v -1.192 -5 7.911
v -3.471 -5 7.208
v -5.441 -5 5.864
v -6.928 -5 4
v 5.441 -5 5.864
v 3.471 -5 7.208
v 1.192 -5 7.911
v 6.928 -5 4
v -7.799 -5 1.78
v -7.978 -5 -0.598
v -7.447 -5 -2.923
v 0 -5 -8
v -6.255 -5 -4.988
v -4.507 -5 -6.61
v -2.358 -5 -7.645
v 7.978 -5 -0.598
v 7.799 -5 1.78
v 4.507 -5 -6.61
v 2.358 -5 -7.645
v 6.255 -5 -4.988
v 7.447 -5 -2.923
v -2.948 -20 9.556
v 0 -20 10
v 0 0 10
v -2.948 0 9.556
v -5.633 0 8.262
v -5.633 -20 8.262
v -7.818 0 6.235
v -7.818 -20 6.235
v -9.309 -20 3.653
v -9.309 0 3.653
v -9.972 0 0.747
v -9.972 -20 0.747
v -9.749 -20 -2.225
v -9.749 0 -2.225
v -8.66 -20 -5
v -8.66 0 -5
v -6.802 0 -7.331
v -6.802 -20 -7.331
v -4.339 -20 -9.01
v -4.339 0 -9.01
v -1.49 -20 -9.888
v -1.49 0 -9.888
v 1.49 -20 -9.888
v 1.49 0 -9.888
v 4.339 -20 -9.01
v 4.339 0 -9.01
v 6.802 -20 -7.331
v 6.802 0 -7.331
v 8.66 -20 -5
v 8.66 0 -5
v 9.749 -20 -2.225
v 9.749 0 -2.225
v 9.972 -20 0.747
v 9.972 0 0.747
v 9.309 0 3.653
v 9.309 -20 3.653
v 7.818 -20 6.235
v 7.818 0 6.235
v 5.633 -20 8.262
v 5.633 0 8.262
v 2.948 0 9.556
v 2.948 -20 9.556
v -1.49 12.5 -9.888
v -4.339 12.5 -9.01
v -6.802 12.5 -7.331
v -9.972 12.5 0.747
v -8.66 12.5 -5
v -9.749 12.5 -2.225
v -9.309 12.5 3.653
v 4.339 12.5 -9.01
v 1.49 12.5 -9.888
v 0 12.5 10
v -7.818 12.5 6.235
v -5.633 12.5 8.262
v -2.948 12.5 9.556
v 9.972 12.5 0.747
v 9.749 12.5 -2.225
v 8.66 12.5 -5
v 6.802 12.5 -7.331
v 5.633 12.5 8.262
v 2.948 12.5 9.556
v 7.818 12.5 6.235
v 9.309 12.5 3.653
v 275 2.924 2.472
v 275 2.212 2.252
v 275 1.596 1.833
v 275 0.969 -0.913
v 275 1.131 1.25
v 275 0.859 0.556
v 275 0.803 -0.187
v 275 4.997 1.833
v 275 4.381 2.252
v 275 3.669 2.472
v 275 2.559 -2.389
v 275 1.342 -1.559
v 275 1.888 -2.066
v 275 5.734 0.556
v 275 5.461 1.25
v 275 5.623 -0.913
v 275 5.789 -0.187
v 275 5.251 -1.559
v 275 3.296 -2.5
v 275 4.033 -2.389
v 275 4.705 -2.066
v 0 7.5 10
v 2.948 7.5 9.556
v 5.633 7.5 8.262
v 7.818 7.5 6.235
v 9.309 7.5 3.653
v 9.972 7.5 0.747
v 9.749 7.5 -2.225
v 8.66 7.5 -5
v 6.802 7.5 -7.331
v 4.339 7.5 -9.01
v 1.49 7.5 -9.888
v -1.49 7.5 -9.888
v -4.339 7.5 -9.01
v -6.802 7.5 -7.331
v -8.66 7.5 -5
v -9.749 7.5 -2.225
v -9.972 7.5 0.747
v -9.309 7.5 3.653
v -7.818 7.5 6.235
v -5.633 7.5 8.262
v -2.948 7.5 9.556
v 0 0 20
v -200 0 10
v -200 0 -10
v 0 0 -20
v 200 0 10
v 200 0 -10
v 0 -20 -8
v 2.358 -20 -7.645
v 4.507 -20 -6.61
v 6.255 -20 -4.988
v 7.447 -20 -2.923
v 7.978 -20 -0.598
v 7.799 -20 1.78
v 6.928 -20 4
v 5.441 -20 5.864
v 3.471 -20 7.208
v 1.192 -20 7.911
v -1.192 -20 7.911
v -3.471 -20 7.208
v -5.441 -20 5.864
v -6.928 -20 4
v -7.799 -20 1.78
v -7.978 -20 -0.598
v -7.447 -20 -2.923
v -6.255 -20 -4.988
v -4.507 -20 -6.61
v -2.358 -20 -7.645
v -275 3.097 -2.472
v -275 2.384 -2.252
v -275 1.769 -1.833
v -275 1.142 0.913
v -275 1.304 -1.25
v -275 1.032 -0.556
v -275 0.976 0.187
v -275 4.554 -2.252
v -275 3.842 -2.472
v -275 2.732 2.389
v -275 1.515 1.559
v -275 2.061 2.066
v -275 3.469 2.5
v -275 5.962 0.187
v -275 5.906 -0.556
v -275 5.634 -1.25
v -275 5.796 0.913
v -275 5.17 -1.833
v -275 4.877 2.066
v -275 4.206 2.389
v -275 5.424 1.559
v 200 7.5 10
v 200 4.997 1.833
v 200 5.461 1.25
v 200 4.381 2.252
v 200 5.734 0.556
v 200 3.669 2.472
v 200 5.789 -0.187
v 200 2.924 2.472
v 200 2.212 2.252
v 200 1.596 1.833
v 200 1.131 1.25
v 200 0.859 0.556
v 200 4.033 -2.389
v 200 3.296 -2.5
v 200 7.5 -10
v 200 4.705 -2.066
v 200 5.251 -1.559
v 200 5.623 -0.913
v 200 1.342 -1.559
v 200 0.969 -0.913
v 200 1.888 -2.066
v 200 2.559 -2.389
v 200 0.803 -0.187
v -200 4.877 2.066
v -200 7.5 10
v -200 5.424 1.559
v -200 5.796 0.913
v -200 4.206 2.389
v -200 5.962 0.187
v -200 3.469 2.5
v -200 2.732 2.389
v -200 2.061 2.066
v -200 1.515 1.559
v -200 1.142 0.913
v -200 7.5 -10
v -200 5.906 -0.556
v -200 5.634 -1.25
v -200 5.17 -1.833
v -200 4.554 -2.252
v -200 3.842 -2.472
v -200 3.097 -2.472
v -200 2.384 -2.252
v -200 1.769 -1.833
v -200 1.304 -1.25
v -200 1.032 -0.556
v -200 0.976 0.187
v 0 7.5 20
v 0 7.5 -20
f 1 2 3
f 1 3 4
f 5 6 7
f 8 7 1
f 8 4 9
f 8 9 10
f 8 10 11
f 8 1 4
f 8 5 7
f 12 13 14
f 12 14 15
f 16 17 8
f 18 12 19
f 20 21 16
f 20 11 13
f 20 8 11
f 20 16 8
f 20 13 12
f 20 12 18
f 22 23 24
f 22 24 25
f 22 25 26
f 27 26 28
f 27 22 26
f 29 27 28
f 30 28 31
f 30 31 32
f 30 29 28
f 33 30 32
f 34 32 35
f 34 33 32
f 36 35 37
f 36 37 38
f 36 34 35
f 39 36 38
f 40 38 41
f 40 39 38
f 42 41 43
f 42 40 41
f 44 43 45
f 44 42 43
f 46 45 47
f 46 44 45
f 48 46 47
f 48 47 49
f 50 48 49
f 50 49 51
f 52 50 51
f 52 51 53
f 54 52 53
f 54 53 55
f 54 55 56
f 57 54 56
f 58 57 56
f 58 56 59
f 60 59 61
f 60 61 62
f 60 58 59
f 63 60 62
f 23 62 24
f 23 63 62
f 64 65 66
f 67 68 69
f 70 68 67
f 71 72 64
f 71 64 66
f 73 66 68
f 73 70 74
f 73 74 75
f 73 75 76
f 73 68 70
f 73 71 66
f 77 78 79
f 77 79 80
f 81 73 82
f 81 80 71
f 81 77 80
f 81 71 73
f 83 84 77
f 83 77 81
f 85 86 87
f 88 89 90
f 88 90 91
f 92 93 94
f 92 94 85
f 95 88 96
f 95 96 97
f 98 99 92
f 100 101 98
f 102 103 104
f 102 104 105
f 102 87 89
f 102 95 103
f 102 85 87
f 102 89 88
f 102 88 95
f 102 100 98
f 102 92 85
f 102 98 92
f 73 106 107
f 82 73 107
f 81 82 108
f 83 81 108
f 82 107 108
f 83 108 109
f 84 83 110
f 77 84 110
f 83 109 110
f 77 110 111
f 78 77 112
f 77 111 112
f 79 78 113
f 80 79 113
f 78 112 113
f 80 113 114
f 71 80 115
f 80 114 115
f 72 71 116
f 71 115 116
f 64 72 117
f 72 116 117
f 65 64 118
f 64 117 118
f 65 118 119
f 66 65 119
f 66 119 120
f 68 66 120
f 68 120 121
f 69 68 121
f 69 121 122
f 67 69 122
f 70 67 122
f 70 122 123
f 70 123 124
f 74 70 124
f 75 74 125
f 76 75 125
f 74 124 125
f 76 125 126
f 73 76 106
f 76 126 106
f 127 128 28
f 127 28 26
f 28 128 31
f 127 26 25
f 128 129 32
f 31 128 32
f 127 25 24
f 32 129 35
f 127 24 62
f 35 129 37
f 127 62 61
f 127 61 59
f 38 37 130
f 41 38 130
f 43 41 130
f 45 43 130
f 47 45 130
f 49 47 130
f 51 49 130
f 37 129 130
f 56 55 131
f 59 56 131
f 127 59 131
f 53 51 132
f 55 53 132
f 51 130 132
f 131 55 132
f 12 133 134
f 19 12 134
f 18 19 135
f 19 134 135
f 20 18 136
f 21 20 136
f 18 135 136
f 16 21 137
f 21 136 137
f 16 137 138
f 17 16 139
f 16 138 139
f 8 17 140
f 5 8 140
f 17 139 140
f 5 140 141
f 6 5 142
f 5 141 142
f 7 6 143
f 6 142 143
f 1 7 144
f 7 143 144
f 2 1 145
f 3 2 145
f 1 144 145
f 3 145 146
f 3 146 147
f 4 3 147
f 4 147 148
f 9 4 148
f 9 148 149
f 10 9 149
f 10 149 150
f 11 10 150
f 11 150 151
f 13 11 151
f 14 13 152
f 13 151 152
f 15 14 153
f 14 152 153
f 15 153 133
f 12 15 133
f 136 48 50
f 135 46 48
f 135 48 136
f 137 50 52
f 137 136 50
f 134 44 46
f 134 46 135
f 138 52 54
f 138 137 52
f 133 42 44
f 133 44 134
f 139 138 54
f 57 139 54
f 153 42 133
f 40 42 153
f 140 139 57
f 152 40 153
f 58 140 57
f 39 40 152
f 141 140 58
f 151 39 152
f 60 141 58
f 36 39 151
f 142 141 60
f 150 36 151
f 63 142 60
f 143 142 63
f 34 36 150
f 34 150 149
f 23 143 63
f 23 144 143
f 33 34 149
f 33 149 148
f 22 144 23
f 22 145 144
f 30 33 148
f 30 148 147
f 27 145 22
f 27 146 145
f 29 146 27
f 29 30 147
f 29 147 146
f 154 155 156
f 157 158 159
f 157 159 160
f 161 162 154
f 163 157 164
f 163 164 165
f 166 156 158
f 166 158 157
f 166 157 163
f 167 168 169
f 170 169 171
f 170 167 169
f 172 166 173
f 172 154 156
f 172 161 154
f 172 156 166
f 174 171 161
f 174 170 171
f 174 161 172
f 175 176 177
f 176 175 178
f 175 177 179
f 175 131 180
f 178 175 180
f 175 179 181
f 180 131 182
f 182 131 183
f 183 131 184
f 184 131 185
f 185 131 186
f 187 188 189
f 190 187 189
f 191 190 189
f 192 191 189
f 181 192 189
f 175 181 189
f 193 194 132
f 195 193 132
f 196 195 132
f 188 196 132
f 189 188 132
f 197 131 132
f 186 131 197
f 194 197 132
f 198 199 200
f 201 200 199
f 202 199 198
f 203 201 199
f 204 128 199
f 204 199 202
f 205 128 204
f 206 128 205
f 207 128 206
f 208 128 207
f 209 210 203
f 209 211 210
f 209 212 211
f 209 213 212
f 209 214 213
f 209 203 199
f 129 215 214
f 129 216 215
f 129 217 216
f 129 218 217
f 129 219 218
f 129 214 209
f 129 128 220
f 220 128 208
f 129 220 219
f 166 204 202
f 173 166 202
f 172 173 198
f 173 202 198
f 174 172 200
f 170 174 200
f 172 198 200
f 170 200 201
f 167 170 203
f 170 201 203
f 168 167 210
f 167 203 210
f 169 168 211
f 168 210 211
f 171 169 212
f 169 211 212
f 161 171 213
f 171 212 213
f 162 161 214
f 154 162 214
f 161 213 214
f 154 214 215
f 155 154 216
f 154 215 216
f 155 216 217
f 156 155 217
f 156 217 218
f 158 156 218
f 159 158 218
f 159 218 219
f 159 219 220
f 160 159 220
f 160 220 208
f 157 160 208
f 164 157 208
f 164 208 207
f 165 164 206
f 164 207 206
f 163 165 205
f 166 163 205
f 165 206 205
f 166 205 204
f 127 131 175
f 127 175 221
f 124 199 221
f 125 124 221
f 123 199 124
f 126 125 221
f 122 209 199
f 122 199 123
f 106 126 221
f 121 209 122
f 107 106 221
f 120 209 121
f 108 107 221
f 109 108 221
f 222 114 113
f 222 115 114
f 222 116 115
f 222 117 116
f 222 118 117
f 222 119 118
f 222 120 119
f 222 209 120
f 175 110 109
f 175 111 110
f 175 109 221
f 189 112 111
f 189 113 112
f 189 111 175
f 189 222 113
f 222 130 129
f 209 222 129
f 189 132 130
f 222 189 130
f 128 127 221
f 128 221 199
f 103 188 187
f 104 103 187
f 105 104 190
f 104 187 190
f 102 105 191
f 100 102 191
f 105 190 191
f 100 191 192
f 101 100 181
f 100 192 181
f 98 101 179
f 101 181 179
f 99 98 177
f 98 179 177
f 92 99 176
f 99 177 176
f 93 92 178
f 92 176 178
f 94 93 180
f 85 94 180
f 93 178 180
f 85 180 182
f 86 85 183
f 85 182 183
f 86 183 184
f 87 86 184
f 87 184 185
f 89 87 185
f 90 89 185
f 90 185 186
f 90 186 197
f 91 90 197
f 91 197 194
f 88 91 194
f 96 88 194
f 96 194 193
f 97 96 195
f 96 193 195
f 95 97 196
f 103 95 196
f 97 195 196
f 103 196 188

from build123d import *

# Parameters (mm, degrees)
SKETCH1_W           = 400
SKETCH1_H           = 20
BOSS_EXTRUDE1_DEPTH = 7.5
SKETCH2_R           = 2.5
BOSS_EXTRUDE2_DEPTH = 75
SKETCH3_R           = 2.5
BOSS_EXTRUDE3_DEPTH = 75
SKETCH5_R           = 10
BOSS_EXTRUDE4_DEPTH = 5
BOSS_EXTRUDE5_START = 20
SKETCH6_R           = 10
BOSS_EXTRUDE5_DEPTH = 20
SKETCH7_R           = 8
CUT_EXTRUDE1_DEPTH  = 15


with BuildPart() as part:
    # Sketch1 → Boss-Extrude1 (new body)
    with BuildSketch(Plane(origin=(0, 0, 0), x_dir=(1, 0, 0), z_dir=(0, 1, 0))):
        Rectangle(SKETCH1_W, SKETCH1_H)
        Polygon((200, 10), (0, 20), (-200, 10), align=None)
        Polygon((0, -20), (-200, -10), (200, -10), align=None)
    extrude(amount=BOSS_EXTRUDE1_DEPTH)

    # Sketch2 → Boss-Extrude2 (add)
    with BuildSketch(Plane(origin=(200, 0, 0), x_dir=(0, 0, -1), z_dir=(1, 0, 0))):
        with Locations((0, 3.296264787)):
            Circle(SKETCH2_R)
    extrude(amount=BOSS_EXTRUDE2_DEPTH)

    # Sketch3 → Boss-Extrude3 (add)
    with BuildSketch(Plane.ZY.offset(200)):
        with Locations((0, 3.469116297)):
            Circle(SKETCH3_R)
    extrude(amount=BOSS_EXTRUDE3_DEPTH)

    # Sketch5 → Boss-Extrude4 (add)
    with BuildSketch(Plane(origin=(0, 7.5, 0), x_dir=(1, 0, 0), z_dir=(0, 1, 0))):
        with Locations(Location((0, 0, 0), (0, 0, 270))):
            Circle(SKETCH5_R)
    extrude(amount=BOSS_EXTRUDE4_DEPTH)

    # Sketch6 → Boss-Extrude5 (add)
    with BuildSketch(Plane.XZ.offset(BOSS_EXTRUDE5_START)):
        with Locations(Location((0, 0, 0), (0, 0, 90))):
            Circle(SKETCH6_R)
    extrude(amount=-BOSS_EXTRUDE5_DEPTH)

    # Sketch7 → Cut-Extrude1 (cut)
    with BuildSketch(Plane(origin=(0, -20, 0), x_dir=(-1, 0, 0), z_dir=(0, -1, 0))):
        with Locations(Location((0, 0, 0), (0, 0, 90))):
            Circle(SKETCH7_R)
    extrude(amount=-CUT_EXTRUDE1_DEPTH, mode=Mode.SUBTRACT)


solid = part.part
